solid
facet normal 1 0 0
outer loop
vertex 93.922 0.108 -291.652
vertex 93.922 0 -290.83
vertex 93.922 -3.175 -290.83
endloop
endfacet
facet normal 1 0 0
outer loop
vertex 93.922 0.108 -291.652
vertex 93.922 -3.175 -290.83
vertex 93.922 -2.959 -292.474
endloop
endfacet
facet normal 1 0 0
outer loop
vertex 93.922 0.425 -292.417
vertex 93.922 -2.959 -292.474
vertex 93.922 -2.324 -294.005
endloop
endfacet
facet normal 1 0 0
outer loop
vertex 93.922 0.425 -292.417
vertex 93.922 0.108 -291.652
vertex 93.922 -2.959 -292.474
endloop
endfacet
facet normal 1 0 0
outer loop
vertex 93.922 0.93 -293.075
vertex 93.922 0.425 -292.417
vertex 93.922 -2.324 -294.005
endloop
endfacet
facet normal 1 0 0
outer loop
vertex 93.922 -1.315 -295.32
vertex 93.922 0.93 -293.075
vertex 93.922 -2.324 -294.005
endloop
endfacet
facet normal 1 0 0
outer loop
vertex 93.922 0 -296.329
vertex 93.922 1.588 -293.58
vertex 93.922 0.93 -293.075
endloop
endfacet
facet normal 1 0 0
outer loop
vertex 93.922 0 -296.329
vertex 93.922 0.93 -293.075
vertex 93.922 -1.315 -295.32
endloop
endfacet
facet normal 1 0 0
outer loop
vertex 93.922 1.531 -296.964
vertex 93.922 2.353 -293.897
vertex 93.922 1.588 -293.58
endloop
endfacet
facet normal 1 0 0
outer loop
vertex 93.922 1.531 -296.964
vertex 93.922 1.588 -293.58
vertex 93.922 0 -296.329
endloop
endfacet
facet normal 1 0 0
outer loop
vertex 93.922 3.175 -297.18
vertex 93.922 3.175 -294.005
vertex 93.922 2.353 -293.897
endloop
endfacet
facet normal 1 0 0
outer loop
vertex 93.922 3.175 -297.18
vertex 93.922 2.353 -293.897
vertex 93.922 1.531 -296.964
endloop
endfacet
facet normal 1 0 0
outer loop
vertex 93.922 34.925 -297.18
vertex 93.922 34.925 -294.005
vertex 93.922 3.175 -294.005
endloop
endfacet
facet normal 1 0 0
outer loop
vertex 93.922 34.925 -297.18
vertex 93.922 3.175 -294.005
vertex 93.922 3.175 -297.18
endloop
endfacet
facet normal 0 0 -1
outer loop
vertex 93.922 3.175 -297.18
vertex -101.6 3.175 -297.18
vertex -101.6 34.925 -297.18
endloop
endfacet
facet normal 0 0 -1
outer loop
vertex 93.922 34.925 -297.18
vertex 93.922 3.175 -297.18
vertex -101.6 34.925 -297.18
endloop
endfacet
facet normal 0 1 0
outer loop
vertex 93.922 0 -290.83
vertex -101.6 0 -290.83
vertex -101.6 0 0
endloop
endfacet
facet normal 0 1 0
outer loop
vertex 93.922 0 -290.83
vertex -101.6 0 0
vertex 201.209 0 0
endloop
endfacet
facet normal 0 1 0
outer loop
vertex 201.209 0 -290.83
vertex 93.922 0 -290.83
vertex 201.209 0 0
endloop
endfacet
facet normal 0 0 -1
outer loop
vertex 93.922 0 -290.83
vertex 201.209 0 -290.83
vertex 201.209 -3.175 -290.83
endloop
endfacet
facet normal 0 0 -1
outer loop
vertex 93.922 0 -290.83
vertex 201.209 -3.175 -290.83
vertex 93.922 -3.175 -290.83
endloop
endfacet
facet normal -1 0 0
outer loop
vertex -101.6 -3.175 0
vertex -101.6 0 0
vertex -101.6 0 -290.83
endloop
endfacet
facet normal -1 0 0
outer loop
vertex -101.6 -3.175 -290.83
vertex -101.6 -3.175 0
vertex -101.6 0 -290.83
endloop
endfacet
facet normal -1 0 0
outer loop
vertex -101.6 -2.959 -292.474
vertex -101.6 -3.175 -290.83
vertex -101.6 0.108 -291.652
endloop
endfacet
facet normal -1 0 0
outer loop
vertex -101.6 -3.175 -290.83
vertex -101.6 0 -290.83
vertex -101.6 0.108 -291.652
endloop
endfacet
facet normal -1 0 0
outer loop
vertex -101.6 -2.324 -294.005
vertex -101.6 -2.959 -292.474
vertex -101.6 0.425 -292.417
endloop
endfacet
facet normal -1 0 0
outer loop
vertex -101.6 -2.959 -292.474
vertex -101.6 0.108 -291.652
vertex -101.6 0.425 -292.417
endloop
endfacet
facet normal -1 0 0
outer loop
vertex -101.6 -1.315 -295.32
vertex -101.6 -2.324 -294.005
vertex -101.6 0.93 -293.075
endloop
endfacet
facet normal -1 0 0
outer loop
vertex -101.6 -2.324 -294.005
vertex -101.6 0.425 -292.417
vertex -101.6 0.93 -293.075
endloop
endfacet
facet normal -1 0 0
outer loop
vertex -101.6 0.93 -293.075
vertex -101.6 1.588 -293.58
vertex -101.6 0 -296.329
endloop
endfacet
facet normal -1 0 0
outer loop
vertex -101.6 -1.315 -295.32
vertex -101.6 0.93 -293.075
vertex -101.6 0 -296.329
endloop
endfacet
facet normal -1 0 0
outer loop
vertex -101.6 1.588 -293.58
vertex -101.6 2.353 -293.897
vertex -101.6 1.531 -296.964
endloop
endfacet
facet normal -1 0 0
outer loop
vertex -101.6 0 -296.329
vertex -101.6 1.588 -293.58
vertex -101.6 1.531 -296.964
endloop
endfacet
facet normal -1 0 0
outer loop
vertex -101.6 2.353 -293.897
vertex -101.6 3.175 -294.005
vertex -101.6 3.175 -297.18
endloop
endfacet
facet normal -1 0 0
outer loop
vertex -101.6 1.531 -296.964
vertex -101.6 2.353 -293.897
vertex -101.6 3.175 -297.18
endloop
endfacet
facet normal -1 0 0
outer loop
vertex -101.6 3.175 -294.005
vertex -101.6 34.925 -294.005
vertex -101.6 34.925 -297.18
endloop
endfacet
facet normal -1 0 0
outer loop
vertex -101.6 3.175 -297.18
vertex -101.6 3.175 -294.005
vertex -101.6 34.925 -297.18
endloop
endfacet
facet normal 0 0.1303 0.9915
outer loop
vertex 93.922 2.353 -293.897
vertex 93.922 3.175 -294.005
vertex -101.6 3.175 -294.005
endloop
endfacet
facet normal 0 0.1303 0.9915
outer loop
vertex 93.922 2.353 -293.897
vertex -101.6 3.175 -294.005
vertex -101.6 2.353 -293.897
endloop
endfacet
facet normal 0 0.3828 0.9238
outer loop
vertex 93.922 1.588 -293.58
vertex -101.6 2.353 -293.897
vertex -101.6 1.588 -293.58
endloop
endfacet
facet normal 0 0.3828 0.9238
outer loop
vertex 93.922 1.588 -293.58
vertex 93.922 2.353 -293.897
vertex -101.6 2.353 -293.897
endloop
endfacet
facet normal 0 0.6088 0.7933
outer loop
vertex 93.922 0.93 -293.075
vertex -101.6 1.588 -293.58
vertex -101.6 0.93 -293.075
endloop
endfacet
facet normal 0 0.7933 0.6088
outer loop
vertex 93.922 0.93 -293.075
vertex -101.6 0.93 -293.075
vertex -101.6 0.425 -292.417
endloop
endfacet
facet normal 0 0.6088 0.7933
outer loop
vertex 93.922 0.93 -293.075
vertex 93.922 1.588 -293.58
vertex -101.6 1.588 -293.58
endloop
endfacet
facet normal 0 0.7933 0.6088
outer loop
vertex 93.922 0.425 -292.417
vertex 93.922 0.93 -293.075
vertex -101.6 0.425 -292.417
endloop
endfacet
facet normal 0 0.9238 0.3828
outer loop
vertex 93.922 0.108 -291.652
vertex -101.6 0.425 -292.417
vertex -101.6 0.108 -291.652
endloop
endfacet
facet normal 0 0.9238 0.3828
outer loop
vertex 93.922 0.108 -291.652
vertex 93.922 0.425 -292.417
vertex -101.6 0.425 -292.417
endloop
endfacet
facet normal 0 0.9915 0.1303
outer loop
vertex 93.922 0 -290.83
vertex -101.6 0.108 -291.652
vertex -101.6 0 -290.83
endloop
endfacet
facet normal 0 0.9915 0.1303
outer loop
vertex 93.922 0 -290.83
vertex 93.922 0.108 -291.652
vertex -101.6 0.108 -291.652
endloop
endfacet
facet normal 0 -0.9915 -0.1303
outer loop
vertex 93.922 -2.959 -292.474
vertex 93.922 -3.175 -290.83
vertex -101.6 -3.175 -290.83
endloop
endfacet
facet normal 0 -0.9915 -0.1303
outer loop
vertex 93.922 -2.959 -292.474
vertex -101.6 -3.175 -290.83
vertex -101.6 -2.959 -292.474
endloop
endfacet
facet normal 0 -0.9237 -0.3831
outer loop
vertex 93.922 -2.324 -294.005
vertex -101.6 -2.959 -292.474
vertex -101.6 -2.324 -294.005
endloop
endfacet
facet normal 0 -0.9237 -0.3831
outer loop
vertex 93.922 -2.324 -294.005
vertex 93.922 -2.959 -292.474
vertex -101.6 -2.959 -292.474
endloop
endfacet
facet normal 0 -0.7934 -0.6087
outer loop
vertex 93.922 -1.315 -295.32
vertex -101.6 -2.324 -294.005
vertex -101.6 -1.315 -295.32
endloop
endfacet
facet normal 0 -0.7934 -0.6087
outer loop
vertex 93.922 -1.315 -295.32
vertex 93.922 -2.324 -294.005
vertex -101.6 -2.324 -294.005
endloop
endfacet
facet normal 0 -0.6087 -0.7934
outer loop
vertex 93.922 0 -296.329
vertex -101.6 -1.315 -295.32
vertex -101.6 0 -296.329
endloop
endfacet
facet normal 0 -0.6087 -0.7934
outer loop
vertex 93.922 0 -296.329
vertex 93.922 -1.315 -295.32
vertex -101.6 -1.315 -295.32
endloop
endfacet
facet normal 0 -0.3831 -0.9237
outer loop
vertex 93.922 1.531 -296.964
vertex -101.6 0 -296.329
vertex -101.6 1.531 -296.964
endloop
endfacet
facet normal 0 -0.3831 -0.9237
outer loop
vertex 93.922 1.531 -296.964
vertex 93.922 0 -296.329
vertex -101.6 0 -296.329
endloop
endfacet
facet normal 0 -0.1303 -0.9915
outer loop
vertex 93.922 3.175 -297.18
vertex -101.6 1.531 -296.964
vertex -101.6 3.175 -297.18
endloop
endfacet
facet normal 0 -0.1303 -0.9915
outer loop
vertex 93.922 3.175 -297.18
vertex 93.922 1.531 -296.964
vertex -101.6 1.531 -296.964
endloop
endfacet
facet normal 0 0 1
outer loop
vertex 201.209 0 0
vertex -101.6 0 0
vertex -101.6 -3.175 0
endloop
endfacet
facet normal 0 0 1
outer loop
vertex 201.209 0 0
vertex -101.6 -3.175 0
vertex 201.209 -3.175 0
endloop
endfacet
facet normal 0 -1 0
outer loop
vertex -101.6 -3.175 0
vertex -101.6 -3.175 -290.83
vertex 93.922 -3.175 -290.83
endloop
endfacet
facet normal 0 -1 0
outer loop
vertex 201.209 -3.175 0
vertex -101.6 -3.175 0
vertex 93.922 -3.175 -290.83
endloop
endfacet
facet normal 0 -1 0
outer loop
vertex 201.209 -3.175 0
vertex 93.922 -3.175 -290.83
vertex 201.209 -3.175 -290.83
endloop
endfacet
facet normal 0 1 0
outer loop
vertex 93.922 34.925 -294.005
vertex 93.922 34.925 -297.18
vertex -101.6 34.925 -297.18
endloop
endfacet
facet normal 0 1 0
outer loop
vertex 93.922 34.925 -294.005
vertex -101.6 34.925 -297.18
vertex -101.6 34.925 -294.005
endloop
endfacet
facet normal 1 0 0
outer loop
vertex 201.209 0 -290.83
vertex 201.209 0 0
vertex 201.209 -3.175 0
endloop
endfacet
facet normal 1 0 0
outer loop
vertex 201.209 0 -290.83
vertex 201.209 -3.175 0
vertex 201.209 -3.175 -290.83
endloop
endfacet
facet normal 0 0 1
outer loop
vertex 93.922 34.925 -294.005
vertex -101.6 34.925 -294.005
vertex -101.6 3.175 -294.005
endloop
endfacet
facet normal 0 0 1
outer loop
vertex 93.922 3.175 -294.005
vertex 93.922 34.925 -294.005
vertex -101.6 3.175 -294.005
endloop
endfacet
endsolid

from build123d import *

# Parameters (mm, degrees)
BASE_FLANGE1_DEPTH = 3.175
EDGE_FLANGE1_DEPTH = 195.521520056


# Sheet-metal steps are written as plain solids
with BuildPart() as part:
    # Sketch1 → Base-Flange1 (new body)
    with BuildSketch(Plane(origin=(0, 0, 0), x_dir=(1, 0, 0), z_dir=(0, 1, 0))):
        Polygon((0, 290.83), (-101.6, 290.83), (-101.6, 0), (0, 0), (201.20864, 0), (201.20864, 290.83), align=None)
    extrude(amount=-BASE_FLANGE1_DEPTH)

    # Edge-Flange1 section (across the edge) → Edge-Flange1 (add)
    with BuildSketch(Plane(origin=(93.921520056, 0, -294.005), x_dir=(0, 0, 1), z_dir=(-1, 0, 0))):
        with BuildLine():
            Line((-3.175, 3.175), (-3.175, 34.925))
            Line((-3.175, 34.925), (0, 34.925))
            Line((0, 34.925), (0, 3.175))
            ThreePointArc((0, 3.175), (0.92993597, 0.92993597), (3.175, 0))
            Line((3.175, 0), (3.175, -3.175))
            ThreePointArc((3.175, -3.175), (-1.315128061, -1.315128061), (-3.175, 3.175))
        make_face()
    extrude(amount=EDGE_FLANGE1_DEPTH)


solid = part.part
